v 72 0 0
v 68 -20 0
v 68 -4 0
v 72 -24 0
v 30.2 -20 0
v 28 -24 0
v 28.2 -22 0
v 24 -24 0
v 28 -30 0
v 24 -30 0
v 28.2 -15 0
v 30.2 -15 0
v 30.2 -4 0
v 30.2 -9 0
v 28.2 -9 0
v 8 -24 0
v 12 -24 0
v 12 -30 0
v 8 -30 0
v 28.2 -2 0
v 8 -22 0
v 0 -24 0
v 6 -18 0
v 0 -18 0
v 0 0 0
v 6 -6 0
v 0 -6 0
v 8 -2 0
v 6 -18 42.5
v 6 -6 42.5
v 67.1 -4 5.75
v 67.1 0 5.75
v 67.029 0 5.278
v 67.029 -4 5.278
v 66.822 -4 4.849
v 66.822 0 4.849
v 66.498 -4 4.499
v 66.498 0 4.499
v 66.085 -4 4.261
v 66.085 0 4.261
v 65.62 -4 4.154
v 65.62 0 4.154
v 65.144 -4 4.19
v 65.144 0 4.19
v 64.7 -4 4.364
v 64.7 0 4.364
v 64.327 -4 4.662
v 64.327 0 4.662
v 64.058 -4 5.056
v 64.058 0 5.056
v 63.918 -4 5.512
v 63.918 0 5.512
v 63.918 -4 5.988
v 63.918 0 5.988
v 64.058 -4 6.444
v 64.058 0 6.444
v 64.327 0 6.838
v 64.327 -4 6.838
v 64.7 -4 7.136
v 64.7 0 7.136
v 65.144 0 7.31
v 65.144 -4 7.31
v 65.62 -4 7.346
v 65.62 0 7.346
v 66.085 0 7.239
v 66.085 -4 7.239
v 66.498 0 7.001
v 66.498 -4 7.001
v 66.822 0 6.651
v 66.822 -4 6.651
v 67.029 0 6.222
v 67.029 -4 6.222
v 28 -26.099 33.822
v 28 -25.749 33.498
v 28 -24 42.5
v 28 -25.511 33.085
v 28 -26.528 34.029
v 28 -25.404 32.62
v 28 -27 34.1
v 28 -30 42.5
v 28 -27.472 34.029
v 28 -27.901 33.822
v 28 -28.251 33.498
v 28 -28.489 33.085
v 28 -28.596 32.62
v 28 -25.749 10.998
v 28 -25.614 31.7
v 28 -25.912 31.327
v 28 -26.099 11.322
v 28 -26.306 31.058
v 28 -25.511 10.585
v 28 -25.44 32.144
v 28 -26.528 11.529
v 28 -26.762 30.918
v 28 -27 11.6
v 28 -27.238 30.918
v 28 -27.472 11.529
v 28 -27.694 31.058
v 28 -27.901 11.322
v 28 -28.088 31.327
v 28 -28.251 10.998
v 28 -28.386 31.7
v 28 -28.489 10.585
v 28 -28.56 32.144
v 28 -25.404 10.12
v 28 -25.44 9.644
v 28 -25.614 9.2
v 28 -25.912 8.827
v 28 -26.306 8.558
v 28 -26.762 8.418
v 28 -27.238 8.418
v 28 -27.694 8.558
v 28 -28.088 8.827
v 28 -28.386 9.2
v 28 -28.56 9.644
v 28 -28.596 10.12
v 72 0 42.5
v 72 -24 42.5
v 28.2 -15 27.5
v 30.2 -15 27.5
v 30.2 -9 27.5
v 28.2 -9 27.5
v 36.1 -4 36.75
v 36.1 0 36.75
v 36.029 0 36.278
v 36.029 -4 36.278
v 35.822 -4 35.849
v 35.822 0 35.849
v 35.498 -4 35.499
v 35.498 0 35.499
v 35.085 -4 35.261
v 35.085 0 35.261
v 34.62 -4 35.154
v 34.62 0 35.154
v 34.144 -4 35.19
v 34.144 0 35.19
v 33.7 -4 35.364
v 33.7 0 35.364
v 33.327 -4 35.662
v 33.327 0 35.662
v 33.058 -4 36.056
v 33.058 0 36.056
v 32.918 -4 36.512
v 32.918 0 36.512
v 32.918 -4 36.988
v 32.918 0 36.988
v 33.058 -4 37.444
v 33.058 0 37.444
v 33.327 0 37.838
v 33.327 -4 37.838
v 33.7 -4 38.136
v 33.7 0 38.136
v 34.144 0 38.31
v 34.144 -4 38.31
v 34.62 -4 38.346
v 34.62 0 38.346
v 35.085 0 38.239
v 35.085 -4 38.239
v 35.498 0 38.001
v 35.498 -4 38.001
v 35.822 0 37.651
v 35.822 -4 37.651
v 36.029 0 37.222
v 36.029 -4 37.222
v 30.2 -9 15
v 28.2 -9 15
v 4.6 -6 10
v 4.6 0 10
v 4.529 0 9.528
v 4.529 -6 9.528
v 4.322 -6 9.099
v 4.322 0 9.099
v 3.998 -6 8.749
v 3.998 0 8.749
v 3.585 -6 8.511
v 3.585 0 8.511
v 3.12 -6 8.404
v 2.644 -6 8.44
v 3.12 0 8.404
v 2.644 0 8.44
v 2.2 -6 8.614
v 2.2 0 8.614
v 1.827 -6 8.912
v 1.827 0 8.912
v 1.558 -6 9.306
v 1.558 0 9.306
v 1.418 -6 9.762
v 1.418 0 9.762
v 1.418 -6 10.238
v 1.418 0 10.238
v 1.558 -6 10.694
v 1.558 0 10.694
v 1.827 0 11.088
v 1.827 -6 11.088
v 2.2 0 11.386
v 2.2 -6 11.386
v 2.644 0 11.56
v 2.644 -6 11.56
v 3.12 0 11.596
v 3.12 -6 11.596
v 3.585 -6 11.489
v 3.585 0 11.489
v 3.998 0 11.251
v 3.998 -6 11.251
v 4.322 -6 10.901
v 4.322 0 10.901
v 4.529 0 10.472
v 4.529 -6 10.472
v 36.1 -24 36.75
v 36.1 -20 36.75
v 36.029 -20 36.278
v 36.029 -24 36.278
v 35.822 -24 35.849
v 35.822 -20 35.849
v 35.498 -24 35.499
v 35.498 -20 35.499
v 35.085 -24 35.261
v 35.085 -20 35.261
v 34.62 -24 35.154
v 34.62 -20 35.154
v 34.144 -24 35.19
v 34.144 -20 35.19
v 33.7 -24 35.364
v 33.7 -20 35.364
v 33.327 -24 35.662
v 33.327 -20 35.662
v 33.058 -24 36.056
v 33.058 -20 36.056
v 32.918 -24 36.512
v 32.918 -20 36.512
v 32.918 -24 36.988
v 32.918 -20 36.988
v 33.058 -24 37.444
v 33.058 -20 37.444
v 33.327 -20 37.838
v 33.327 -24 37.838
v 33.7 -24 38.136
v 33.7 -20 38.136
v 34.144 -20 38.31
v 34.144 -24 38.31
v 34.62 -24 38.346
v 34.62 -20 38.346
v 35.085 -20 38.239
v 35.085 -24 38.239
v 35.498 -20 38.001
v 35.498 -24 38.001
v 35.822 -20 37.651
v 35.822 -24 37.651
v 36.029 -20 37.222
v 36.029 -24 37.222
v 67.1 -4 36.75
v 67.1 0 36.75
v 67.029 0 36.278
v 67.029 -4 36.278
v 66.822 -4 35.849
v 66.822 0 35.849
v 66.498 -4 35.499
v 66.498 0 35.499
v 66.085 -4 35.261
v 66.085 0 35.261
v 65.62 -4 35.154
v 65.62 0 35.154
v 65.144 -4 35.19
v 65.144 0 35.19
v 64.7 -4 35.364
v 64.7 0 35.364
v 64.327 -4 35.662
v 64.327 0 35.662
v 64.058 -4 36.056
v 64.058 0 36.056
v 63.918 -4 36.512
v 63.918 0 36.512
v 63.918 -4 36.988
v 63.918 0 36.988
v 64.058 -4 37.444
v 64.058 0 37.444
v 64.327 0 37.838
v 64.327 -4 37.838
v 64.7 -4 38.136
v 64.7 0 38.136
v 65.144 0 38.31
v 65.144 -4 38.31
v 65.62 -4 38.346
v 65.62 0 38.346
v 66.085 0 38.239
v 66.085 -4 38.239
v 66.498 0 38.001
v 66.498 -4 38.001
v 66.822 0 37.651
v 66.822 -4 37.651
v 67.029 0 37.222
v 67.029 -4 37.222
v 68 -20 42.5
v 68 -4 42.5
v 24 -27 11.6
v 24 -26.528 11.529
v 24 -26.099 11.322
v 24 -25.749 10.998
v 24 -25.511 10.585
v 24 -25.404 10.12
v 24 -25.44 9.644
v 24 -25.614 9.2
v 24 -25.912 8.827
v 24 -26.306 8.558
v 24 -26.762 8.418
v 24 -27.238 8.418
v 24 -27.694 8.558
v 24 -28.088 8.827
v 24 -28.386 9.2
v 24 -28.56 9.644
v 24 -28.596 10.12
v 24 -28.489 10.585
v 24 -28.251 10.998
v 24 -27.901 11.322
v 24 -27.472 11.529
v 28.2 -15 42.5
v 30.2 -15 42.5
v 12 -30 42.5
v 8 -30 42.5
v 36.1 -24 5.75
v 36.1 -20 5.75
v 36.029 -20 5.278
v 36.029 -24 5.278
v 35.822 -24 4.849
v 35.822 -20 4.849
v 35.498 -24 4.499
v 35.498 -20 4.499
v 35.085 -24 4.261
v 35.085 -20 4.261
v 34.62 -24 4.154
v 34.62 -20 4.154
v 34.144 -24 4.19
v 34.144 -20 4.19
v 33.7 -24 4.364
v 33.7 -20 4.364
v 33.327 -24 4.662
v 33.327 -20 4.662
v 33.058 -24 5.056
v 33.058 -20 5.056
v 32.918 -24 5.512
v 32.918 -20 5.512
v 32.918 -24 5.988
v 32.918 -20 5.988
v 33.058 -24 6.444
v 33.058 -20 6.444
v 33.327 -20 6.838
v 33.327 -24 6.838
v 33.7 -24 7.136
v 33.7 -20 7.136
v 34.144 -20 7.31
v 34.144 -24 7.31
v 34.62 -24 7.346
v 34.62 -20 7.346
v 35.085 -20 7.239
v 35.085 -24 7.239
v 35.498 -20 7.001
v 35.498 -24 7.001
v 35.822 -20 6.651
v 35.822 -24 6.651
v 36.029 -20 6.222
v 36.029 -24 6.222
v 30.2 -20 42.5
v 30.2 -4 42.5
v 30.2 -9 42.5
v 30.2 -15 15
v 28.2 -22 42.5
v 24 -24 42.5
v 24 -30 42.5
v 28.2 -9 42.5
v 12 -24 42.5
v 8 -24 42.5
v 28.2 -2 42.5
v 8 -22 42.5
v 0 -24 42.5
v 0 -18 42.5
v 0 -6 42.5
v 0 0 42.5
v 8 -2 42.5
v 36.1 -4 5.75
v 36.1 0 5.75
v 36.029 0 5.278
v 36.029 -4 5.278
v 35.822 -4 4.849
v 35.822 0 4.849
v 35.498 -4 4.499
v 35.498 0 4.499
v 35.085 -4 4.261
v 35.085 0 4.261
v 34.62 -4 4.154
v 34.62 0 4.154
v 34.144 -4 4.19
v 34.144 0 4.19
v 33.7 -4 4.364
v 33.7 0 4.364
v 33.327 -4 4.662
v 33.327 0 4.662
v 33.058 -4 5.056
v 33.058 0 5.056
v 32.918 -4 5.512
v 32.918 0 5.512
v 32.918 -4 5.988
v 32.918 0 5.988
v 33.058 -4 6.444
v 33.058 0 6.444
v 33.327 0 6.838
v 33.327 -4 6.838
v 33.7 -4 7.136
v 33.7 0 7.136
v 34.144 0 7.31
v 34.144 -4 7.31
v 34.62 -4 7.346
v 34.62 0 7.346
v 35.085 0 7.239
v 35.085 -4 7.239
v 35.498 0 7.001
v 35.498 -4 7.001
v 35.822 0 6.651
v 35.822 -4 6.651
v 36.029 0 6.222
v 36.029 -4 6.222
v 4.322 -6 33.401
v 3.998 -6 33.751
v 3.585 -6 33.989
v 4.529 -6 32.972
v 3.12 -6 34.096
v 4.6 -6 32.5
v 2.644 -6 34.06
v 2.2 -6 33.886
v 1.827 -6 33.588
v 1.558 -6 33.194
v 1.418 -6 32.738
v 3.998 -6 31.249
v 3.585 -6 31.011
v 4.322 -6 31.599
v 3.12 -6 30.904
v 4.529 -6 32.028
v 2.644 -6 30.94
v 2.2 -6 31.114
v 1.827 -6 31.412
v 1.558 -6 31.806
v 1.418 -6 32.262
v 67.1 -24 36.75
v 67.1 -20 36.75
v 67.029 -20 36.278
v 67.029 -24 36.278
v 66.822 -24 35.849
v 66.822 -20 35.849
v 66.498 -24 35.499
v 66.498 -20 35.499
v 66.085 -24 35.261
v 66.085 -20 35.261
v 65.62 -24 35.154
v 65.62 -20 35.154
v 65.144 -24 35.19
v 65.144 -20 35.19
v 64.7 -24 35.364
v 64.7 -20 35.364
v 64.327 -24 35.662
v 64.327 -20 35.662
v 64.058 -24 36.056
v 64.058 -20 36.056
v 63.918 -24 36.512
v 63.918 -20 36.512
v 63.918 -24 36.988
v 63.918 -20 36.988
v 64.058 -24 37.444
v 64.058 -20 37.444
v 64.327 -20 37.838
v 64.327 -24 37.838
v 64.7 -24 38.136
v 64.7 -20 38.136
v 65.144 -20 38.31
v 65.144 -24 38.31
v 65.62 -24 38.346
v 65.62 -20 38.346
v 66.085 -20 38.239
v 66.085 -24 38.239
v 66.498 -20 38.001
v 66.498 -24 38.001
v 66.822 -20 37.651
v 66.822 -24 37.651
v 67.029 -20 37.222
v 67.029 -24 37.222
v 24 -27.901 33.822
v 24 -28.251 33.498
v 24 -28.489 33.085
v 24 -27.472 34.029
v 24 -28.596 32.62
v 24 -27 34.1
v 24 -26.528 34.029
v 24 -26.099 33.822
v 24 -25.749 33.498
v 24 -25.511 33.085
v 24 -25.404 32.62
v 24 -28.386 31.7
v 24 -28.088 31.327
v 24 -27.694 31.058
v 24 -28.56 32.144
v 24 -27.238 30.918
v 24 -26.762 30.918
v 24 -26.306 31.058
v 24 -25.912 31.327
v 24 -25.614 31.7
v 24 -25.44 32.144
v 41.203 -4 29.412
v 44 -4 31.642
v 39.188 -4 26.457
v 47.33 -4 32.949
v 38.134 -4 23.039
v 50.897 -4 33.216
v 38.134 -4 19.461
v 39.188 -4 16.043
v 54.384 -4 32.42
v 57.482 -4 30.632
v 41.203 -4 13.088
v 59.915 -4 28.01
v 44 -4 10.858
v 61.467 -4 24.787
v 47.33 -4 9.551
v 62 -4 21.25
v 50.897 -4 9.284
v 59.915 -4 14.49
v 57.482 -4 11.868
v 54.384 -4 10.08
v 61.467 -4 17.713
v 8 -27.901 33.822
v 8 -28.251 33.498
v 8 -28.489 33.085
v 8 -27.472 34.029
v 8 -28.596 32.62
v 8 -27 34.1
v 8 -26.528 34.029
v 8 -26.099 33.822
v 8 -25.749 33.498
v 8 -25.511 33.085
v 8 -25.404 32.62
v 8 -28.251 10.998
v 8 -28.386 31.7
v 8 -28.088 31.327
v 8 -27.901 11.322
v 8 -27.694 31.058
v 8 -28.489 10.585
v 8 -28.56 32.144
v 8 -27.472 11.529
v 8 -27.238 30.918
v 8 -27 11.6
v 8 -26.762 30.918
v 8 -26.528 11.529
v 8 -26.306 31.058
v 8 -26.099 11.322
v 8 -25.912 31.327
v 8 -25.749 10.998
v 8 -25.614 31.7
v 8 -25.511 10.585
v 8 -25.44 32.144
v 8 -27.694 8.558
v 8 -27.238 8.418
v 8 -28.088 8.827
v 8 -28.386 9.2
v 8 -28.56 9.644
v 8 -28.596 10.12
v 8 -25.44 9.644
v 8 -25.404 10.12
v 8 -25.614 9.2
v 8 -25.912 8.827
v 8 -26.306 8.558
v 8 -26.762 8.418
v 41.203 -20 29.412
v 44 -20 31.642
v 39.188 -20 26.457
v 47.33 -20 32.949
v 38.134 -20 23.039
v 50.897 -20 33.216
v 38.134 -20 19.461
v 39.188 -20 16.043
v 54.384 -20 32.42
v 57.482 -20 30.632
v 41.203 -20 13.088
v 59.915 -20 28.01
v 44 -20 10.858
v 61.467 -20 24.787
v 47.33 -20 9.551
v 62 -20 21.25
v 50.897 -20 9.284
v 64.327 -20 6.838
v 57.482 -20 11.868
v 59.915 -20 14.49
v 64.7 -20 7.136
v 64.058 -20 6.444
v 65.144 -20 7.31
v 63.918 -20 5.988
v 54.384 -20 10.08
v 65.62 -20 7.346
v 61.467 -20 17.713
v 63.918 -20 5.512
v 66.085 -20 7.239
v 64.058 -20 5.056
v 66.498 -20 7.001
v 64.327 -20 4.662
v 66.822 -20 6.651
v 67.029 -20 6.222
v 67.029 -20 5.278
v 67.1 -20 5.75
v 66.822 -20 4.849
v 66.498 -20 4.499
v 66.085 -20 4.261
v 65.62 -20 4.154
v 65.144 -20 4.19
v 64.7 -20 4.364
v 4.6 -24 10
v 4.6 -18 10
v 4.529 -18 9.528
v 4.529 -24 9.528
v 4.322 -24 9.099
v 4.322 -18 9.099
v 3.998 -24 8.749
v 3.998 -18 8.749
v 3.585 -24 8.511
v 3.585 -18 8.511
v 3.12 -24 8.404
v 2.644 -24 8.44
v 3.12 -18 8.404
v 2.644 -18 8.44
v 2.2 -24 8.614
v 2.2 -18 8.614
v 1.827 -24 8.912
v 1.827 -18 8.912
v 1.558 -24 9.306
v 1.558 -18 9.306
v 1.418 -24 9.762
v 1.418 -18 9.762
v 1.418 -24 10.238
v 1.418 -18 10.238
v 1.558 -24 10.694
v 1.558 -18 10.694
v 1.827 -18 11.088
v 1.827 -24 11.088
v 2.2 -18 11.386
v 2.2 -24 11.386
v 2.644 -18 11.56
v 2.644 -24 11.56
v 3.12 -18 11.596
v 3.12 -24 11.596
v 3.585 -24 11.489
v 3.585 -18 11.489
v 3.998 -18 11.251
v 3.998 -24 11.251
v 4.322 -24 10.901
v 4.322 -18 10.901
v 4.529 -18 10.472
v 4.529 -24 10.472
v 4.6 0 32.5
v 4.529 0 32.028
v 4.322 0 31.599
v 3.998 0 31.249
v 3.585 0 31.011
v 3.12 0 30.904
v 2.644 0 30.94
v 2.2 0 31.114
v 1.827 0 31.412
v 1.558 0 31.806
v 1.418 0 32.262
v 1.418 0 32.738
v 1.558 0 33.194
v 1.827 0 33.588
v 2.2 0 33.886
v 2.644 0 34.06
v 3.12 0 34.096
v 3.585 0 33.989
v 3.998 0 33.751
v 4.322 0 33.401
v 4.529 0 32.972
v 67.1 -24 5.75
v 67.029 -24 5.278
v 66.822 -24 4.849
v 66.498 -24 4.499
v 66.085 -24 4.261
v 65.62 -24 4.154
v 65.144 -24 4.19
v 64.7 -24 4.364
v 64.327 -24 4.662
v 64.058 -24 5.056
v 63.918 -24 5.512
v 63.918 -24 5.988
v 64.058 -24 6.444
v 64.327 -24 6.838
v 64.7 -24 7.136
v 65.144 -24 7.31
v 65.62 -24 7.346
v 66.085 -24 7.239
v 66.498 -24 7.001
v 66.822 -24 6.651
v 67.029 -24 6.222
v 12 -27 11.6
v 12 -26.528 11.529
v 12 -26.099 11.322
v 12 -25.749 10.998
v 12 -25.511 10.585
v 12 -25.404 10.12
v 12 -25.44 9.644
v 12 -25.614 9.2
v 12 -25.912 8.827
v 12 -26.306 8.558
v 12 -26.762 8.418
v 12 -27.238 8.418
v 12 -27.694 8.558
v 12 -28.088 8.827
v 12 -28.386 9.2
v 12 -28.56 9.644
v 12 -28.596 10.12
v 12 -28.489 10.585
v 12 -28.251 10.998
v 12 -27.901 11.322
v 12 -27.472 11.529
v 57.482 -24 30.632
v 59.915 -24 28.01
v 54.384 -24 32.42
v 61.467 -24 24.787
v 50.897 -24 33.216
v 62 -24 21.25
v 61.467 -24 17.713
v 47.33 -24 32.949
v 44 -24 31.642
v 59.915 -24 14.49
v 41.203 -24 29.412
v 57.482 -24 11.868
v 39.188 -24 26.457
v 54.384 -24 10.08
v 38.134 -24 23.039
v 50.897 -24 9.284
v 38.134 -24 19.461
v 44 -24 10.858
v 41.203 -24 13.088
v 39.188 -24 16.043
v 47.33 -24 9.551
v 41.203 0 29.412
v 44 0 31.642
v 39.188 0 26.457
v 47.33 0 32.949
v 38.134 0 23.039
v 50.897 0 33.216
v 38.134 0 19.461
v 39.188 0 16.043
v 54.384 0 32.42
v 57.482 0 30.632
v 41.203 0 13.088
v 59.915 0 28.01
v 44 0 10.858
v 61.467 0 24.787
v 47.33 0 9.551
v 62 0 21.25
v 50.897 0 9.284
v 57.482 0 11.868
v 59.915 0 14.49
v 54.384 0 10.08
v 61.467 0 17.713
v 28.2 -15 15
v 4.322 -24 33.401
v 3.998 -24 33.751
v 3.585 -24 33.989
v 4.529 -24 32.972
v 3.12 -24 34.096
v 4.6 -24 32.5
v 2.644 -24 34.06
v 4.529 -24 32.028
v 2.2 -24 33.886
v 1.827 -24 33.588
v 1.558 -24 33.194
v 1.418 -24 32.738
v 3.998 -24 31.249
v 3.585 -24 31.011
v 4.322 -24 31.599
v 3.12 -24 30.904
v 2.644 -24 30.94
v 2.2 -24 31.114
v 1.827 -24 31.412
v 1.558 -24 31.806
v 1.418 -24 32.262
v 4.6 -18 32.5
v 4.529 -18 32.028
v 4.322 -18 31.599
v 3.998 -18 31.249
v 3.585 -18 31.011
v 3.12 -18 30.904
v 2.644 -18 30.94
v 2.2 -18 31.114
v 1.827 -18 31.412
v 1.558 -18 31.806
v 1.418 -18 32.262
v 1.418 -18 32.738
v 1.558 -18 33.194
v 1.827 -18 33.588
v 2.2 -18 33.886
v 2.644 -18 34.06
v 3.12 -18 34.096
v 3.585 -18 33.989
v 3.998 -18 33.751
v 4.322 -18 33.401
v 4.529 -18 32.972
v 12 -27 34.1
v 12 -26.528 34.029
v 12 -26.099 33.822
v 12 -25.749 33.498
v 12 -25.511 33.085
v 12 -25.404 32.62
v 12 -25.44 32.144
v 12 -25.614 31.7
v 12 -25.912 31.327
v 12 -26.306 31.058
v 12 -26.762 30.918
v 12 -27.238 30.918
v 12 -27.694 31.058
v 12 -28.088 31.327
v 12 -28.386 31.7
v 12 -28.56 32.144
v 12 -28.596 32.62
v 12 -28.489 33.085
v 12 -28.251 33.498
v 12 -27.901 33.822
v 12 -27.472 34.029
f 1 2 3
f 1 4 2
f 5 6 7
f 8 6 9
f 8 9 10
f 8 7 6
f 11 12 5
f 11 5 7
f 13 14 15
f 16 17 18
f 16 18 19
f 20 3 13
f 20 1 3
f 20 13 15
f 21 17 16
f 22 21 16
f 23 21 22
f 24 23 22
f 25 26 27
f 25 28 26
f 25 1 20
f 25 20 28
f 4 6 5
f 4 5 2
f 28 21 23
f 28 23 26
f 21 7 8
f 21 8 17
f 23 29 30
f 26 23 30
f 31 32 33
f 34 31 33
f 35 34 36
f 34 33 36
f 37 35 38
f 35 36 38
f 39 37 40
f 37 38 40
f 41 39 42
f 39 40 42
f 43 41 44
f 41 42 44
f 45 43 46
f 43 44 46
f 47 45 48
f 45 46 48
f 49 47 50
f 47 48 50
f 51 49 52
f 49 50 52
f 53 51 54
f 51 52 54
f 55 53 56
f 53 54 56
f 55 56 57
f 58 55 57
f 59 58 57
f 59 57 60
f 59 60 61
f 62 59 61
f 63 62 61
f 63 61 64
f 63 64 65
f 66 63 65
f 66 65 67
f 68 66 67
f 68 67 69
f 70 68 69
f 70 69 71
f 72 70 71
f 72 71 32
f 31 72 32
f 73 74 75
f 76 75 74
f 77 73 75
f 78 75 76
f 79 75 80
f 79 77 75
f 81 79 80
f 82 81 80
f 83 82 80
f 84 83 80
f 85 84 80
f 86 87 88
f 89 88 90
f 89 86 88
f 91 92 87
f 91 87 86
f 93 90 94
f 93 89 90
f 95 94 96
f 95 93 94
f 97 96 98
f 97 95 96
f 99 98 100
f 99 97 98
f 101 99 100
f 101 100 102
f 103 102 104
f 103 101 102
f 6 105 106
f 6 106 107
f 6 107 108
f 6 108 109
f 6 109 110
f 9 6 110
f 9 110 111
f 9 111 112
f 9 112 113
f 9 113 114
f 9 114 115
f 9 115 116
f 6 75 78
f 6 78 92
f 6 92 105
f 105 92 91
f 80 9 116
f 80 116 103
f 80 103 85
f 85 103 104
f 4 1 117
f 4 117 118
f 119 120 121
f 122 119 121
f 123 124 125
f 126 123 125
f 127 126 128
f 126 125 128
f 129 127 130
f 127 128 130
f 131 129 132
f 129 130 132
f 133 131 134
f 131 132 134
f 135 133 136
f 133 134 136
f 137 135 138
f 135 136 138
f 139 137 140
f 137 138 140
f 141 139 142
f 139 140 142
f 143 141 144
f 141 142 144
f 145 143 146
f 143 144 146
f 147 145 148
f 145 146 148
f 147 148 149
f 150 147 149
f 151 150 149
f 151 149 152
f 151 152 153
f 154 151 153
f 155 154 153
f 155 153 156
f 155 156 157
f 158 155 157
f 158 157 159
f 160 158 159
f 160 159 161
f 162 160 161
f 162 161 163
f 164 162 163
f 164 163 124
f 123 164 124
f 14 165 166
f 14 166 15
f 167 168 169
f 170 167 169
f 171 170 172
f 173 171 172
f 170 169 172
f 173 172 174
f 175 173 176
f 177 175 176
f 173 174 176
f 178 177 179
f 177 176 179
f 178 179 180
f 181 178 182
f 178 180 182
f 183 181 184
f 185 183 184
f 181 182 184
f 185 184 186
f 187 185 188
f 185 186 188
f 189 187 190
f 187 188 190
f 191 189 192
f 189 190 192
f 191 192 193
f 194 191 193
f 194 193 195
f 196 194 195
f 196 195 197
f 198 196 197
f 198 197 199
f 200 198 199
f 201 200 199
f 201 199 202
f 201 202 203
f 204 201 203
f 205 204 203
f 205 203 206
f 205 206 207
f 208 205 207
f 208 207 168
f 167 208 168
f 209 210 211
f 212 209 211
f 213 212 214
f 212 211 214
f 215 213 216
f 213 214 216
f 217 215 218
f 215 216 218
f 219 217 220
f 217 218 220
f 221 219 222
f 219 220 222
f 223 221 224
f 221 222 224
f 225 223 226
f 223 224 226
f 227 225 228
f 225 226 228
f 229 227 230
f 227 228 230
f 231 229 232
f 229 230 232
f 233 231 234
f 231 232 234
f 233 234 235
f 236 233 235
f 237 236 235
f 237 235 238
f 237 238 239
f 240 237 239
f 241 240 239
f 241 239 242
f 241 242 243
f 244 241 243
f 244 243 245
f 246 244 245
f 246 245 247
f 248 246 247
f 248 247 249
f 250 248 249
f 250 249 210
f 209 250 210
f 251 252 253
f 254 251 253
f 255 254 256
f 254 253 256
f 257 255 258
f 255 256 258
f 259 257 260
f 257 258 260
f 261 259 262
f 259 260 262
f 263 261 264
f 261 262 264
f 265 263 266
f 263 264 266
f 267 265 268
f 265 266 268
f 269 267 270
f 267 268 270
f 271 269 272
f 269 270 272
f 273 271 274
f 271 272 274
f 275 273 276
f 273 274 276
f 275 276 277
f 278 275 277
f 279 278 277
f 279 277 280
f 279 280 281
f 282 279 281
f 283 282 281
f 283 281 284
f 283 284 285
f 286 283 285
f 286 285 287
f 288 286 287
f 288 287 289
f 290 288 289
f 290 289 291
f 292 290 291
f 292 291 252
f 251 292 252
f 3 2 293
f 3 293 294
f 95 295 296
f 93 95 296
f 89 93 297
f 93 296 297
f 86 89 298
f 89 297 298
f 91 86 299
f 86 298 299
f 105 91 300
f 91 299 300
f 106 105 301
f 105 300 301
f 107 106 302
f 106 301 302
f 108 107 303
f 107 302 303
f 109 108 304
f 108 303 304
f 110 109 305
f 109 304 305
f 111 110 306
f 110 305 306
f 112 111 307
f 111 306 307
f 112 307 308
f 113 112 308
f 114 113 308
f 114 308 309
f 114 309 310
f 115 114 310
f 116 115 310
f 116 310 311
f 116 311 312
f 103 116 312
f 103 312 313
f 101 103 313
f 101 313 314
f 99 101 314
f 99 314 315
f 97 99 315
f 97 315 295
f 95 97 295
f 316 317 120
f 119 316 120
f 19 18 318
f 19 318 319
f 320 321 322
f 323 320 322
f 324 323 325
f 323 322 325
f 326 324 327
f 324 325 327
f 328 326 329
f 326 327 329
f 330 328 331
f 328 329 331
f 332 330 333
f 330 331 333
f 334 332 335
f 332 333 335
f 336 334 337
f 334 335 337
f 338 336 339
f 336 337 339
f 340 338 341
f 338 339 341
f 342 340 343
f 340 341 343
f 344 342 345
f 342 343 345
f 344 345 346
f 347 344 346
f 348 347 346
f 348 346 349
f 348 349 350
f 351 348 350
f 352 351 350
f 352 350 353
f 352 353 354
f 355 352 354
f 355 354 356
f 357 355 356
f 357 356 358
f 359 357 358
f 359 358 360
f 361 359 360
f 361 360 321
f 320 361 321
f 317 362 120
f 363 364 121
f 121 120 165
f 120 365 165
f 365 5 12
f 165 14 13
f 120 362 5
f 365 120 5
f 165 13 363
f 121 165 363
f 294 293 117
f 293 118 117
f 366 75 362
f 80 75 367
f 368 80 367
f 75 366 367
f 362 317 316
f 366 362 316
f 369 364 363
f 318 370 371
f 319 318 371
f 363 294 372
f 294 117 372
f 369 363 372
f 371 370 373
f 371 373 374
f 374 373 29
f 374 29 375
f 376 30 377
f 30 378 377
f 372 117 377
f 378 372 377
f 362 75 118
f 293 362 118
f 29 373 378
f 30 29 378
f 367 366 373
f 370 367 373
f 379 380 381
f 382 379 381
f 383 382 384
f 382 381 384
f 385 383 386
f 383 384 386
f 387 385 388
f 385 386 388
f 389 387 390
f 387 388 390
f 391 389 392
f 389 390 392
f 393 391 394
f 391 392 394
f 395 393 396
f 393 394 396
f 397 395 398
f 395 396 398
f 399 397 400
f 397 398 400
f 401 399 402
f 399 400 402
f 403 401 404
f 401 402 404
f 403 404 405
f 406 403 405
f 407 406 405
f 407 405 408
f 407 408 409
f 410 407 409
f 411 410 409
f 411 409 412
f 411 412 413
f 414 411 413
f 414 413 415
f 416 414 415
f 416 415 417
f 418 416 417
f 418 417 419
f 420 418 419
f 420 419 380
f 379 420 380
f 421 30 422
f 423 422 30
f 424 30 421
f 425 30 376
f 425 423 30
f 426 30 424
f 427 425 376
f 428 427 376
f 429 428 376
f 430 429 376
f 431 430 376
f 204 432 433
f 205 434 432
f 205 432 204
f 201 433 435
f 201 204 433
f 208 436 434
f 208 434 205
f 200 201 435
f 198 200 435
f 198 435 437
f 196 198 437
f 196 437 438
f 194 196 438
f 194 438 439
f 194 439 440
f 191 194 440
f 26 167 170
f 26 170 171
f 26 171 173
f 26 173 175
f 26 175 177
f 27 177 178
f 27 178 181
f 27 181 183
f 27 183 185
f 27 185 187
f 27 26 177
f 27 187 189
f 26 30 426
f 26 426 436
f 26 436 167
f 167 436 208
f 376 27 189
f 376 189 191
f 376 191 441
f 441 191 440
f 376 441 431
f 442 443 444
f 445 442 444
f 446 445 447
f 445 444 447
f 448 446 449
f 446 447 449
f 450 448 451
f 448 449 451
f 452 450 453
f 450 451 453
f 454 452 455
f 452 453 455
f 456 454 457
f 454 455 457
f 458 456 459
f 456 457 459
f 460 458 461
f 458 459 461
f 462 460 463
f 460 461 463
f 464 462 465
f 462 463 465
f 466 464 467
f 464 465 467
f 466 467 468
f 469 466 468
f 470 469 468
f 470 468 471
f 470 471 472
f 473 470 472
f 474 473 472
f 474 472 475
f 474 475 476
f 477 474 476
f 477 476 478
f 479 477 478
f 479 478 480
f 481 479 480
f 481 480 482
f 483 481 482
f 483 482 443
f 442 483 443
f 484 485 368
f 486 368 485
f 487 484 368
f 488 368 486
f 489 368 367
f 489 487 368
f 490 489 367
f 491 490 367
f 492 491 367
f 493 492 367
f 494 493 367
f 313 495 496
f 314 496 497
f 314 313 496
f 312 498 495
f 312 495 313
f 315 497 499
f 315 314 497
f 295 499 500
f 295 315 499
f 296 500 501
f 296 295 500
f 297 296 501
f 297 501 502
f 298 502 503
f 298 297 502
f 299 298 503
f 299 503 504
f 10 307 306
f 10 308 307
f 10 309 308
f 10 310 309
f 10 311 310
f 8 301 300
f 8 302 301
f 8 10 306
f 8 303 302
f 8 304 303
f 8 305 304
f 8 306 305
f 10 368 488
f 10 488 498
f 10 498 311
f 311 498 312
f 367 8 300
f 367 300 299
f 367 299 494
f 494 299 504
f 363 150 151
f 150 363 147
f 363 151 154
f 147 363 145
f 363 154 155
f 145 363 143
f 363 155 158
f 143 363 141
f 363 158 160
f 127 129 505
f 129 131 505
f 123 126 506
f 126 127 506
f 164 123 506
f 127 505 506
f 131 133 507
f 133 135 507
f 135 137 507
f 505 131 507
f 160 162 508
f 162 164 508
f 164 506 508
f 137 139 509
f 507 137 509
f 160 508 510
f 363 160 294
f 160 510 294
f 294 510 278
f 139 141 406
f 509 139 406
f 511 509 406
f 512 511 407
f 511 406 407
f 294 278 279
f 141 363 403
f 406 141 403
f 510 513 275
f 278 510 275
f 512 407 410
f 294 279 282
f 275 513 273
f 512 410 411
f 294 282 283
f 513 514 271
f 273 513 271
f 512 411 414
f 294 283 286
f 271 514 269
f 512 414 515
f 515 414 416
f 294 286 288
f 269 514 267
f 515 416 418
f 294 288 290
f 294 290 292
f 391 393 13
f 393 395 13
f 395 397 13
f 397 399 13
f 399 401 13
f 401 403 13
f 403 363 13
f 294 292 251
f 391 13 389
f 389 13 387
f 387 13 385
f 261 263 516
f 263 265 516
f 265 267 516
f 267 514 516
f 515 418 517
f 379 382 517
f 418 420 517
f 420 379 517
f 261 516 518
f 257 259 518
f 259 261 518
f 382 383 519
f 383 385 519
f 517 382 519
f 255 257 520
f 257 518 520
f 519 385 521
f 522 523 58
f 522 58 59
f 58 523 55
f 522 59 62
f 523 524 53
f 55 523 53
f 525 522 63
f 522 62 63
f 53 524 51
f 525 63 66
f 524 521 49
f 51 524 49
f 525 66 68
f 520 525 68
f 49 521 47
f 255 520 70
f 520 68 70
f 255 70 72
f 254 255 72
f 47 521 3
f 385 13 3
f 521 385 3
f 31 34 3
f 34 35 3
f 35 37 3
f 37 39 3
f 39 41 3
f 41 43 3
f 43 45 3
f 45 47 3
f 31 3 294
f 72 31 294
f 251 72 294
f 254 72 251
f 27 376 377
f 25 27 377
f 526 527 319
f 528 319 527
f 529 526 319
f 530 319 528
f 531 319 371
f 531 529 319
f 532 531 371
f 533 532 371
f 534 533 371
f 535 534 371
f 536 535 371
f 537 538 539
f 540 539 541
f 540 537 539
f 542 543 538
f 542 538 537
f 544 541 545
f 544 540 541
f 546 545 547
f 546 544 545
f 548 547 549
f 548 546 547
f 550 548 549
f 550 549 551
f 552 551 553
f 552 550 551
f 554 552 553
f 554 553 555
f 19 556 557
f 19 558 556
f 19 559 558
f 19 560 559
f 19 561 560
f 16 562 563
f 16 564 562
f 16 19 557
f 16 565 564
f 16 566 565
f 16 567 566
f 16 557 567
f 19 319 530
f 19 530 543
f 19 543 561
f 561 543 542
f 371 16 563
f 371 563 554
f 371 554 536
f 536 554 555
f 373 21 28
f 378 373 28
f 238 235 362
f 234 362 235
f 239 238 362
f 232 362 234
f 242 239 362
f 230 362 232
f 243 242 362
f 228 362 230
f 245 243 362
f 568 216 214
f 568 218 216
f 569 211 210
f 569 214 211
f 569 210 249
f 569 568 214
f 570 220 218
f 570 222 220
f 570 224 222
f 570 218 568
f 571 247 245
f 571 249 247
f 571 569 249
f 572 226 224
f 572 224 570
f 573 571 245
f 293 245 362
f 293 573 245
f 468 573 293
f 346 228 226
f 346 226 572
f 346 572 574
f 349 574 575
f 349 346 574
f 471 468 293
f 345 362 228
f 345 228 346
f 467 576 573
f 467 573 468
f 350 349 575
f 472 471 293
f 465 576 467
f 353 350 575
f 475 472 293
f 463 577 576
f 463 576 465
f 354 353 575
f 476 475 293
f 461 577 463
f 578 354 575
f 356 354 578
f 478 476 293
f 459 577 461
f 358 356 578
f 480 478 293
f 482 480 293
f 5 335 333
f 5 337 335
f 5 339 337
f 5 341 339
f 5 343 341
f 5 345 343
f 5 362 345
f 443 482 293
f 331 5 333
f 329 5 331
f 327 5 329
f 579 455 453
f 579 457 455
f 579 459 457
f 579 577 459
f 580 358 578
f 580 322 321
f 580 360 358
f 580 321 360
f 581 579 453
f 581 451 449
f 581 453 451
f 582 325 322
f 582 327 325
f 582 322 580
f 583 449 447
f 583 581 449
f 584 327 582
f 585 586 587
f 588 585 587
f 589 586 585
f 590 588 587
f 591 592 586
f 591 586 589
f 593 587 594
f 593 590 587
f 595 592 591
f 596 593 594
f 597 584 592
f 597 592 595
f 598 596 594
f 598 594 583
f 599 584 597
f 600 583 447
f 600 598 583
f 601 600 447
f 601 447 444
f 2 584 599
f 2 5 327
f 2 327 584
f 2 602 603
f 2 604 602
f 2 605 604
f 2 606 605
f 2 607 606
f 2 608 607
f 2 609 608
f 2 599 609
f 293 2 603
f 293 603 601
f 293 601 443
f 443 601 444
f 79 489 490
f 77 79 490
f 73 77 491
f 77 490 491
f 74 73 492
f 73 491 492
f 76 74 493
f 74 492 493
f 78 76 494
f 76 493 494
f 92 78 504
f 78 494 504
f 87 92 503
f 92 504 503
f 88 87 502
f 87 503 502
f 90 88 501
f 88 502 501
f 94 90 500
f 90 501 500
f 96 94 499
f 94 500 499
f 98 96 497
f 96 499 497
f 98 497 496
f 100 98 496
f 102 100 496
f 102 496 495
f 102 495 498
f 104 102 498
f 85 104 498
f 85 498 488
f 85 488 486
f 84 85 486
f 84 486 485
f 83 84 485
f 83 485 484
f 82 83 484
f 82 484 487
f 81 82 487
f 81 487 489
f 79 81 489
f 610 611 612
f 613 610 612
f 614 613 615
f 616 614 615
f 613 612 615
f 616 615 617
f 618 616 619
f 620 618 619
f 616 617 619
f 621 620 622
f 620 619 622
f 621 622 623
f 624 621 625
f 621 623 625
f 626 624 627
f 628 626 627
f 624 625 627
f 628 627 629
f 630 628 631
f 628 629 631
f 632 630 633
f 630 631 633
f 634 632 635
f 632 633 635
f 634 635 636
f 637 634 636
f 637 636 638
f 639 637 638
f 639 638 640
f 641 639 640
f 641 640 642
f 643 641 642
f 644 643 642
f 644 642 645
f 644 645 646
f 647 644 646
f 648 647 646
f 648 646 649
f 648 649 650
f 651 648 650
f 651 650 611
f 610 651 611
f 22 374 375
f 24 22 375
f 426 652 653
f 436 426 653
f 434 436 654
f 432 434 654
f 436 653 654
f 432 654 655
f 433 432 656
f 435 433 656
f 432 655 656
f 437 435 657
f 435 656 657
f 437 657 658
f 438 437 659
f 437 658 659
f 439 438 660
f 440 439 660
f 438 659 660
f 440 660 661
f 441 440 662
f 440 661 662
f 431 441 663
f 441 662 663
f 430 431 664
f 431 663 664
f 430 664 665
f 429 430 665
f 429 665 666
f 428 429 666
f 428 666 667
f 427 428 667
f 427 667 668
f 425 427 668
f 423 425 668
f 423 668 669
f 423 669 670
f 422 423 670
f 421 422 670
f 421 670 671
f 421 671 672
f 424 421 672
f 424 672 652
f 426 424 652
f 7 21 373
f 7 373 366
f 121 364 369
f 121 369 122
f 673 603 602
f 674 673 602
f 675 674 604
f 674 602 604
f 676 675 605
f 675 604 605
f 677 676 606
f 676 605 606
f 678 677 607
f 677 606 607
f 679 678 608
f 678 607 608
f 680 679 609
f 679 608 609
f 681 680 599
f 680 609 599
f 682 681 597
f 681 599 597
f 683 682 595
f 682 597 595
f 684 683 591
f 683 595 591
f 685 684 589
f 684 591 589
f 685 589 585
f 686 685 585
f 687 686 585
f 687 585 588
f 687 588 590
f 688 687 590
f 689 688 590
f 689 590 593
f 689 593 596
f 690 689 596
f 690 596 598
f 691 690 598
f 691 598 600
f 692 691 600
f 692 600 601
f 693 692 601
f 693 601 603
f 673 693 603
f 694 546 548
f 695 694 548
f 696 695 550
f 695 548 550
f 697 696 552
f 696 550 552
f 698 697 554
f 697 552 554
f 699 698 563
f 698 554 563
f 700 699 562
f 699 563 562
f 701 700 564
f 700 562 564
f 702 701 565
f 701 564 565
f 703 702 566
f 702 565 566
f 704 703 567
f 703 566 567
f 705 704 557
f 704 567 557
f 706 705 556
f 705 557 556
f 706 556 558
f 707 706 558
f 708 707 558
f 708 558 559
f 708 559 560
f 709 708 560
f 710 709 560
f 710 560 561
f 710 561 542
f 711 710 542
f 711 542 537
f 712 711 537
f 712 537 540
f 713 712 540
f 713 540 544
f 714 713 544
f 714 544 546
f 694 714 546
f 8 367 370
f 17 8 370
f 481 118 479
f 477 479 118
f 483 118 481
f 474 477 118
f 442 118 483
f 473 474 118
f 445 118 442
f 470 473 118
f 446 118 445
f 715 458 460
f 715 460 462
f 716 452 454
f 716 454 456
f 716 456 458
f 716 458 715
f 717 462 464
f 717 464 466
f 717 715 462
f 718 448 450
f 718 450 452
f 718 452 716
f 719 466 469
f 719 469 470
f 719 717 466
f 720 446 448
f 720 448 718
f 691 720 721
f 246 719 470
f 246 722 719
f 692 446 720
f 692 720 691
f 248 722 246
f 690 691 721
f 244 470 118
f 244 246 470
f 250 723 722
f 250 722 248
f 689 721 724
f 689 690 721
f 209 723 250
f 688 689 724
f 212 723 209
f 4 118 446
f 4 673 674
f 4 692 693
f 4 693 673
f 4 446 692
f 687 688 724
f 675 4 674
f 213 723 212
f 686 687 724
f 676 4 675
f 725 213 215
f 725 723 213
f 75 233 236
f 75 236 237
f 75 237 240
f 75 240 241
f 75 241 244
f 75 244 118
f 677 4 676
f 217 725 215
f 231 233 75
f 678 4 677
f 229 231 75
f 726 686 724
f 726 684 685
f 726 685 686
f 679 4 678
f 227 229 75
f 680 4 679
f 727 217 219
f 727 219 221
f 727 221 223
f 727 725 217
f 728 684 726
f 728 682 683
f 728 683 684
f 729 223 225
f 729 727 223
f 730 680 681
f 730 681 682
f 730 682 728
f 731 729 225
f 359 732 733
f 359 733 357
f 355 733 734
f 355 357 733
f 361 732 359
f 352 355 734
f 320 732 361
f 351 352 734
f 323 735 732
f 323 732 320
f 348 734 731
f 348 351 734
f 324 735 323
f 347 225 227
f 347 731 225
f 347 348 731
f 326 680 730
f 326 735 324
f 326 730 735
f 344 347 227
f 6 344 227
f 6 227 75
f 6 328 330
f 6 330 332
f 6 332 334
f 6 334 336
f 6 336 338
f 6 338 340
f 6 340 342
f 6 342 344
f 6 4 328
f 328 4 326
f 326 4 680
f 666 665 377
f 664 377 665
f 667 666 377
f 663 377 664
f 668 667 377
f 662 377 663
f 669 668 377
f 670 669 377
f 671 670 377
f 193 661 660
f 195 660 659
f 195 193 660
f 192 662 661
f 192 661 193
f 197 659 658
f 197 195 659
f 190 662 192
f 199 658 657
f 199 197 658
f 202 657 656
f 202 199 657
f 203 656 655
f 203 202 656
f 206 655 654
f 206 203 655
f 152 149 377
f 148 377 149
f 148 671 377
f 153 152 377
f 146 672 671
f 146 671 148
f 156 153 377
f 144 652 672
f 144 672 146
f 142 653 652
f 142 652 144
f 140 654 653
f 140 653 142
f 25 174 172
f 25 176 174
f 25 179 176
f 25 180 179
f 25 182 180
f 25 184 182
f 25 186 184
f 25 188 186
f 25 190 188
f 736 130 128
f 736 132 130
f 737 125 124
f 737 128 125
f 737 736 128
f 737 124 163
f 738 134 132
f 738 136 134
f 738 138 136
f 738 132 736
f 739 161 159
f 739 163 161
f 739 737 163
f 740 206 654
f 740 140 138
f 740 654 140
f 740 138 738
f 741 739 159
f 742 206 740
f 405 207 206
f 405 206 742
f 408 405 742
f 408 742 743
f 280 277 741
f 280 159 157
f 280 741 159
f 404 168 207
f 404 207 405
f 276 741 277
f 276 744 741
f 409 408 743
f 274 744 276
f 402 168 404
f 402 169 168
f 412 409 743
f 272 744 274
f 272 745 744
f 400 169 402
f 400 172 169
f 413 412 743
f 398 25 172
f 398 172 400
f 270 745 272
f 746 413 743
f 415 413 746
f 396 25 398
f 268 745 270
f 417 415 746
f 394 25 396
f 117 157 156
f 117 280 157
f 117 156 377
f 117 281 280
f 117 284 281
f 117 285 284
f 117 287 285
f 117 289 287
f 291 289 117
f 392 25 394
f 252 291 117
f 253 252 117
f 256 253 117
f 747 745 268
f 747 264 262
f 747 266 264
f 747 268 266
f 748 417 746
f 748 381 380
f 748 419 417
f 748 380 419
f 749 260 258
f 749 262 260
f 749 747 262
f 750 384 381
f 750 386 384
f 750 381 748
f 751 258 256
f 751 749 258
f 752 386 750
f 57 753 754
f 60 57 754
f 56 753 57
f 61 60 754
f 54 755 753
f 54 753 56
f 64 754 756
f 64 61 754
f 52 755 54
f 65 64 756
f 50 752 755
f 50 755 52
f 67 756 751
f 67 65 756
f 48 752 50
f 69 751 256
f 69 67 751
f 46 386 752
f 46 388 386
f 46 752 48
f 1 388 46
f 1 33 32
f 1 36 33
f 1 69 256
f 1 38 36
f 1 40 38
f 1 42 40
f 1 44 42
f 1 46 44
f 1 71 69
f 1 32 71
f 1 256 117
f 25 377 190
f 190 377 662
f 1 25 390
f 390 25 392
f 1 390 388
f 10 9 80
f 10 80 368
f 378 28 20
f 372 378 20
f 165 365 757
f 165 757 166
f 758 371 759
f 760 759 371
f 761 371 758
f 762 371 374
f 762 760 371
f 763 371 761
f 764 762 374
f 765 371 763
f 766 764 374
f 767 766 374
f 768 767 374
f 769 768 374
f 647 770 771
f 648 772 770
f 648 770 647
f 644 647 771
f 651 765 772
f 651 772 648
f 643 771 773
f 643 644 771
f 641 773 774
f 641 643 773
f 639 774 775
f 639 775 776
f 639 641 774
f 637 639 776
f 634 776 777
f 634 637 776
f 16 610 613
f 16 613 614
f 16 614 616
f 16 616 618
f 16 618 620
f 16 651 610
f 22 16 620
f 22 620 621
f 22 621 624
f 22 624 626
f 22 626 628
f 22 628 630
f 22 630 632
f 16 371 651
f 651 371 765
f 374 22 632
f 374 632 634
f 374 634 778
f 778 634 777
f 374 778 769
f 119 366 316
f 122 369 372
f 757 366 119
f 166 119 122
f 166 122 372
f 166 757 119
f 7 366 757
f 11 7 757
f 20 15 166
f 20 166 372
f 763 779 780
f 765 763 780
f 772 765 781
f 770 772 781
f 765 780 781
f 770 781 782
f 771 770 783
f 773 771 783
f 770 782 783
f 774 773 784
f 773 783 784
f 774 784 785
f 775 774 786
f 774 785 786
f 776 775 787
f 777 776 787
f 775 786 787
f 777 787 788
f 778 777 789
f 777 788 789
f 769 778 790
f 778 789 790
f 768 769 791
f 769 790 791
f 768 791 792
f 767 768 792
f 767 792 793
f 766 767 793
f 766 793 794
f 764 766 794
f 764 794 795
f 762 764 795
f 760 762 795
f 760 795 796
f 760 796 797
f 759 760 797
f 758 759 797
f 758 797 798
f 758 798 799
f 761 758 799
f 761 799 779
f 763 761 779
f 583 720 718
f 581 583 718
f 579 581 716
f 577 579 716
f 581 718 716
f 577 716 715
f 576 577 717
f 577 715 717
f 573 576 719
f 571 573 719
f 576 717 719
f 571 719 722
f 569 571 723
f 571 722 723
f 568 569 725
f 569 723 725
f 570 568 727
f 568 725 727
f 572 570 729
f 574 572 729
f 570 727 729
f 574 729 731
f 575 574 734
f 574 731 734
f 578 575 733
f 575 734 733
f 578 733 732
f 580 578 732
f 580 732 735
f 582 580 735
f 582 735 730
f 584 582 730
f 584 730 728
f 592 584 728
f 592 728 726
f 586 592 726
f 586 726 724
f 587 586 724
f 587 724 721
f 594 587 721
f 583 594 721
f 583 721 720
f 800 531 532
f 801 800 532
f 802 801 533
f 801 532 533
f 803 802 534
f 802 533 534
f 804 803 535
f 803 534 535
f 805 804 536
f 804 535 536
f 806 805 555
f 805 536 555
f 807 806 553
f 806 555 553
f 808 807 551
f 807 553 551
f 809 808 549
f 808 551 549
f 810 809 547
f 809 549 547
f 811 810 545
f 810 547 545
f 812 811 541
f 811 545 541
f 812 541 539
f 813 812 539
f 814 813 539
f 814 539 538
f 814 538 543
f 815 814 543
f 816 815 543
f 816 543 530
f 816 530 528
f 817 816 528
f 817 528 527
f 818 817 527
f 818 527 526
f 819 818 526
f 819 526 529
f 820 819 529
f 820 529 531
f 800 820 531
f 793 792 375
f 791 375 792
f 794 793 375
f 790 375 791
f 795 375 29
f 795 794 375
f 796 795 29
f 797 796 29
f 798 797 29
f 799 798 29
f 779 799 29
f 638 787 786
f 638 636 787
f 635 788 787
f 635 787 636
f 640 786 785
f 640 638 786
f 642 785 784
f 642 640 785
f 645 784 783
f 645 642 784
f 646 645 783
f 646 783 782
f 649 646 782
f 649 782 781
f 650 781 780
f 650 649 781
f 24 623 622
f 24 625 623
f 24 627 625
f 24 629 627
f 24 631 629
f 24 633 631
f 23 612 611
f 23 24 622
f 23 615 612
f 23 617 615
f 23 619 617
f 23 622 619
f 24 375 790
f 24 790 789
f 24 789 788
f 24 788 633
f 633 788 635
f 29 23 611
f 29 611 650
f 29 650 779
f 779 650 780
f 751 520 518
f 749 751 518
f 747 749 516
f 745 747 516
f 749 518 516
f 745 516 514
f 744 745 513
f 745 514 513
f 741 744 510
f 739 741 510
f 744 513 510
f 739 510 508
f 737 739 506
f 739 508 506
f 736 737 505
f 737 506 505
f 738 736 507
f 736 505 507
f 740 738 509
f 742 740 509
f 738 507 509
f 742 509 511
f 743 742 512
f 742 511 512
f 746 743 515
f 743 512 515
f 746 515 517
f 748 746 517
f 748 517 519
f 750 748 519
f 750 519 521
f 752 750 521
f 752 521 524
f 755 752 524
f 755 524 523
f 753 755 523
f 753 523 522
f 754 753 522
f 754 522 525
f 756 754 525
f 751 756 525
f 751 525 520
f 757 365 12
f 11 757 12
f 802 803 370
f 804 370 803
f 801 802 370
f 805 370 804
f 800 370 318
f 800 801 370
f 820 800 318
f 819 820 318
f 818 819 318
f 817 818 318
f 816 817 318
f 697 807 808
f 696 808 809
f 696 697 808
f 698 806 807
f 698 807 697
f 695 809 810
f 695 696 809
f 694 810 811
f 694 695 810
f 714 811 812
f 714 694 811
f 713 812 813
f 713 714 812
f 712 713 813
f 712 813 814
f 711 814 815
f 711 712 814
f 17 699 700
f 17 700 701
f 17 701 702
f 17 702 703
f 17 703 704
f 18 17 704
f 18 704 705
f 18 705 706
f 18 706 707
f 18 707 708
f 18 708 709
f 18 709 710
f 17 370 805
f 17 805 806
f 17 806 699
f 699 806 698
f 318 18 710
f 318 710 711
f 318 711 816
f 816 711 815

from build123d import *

# Parameters (mm, degrees)
ESQUISSE1_W             = 20.2
ESQUISSE1_H             = 20
ESQUISSE1_W_2           = 37.8
ESQUISSE1_H_2           = 16
BOSS_EXTRU_1_DEPTH      = 42.5
ESQUISSE2_R             = 12
ENL_V_MAT_EXTRU_1_DEPTH = 25
D_GAGEMENT_M31_D        = 3.2
D_GAGEMENT_M32_D        = 3.2
D_GAGEMENT_M33_D        = 3.2
ENL_V_MAT_EXTRU_2_REACH = 32.2
ESQUISSE11_W            = 15
ESQUISSE11_H            = 6


with BuildPart() as part:
    # Esquisse1 → Boss.-Extru.1 (new body)
    with BuildSketch(Plane.XY):
        Polygon((0, 0), (72, 0), (72, -24), (28, -24), (28, -30), (24, -30), (24, -24), (12, -24), (12, -30), (8, -30), (8, -24), (0, -24), (0, -18), (6, -18), (6, -6), (0, -6), align=None)
        with Locations((18.1, -12)):
            Rectangle(ESQUISSE1_W, ESQUISSE1_H, mode=Mode.SUBTRACT)
        with Locations((49.1, -12)):
            Rectangle(ESQUISSE1_W_2, ESQUISSE1_H_2, mode=Mode.SUBTRACT)
    extrude(amount=BOSS_EXTRU_1_DEPTH)

    # Esquisse2 → Enlèv. mat.-Extru.1 (cut, through all)
    with BuildSketch(Plane.XZ.offset(24)):
        with Locations((50, 21.25)):
            Circle(ESQUISSE2_R)
    extrude(amount=-ENL_V_MAT_EXTRU_1_DEPTH, mode=Mode.SUBTRACT)

    # Dégagement M31 (through all)
    with Locations(Plane(origin=(0, -24, 0), x_dir=(-1, 0, 0), z_dir=(0, -1, 0))):
        with Locations((-50, -21.25), (-34.5, -5.75), (-65.5, -36.75), (-65.5, -5.75), (-34.5, -36.75)):
            Hole(D_GAGEMENT_M31_D / 2)

    # Dégagement M32 (through all)
    with Locations(Plane(origin=(28, 0, 0), x_dir=(0, 0, -1), z_dir=(1, 0, 0))):
        with Locations((-10, -27), (-32.5, -27)):
            Hole(D_GAGEMENT_M32_D / 2)

    # Dégagement M33 (through all)
    with Locations(Plane(origin=(0, -24, 0), x_dir=(-1, 0, 0), z_dir=(0, -1, 0))):
        with Locations((-3, -10), (-3, -32.5)):
            Hole(D_GAGEMENT_M33_D / 2)

    # Esquisse11 → Enlèv. mat.-Extru.2 (cut, up to next)
    with BuildSketch(Plane(origin=(30.2, 0, 0), x_dir=(0, 0, -1), z_dir=(1, 0, 0)), mode=Mode.PRIVATE) as enl_v_mat_extru_2_sk1:
        with Locations((-7.5, -12)):
            Rectangle(ESQUISSE11_W, ESQUISSE11_H)
    enl_v_mat_extru_2_tool1 = extrude(enl_v_mat_extru_2_sk1.sketch, amount=-ENL_V_MAT_EXTRU_2_REACH, mode=Mode.PRIVATE) & part.part
    add(enl_v_mat_extru_2_tool1.solids().sort_by_distance((30.2, -12, 7.5))[0], mode=Mode.SUBTRACT)
    # Esquisse11 → Enlèv. mat.-Extru.2 (cut, up to next)
    with BuildSketch(Plane(origin=(30.2, 0, 0), x_dir=(0, 0, -1), z_dir=(1, 0, 0)), mode=Mode.PRIVATE) as enl_v_mat_extru_2_sk2:
        with Locations((-35, -12)):
            Rectangle(ESQUISSE11_W, ESQUISSE11_H)
    enl_v_mat_extru_2_tool2 = extrude(enl_v_mat_extru_2_sk2.sketch, amount=-ENL_V_MAT_EXTRU_2_REACH, mode=Mode.PRIVATE) & part.part
    add(enl_v_mat_extru_2_tool2.solids().sort_by_distance((30.2, -12, 35))[0], mode=Mode.SUBTRACT)


solid = part.part
